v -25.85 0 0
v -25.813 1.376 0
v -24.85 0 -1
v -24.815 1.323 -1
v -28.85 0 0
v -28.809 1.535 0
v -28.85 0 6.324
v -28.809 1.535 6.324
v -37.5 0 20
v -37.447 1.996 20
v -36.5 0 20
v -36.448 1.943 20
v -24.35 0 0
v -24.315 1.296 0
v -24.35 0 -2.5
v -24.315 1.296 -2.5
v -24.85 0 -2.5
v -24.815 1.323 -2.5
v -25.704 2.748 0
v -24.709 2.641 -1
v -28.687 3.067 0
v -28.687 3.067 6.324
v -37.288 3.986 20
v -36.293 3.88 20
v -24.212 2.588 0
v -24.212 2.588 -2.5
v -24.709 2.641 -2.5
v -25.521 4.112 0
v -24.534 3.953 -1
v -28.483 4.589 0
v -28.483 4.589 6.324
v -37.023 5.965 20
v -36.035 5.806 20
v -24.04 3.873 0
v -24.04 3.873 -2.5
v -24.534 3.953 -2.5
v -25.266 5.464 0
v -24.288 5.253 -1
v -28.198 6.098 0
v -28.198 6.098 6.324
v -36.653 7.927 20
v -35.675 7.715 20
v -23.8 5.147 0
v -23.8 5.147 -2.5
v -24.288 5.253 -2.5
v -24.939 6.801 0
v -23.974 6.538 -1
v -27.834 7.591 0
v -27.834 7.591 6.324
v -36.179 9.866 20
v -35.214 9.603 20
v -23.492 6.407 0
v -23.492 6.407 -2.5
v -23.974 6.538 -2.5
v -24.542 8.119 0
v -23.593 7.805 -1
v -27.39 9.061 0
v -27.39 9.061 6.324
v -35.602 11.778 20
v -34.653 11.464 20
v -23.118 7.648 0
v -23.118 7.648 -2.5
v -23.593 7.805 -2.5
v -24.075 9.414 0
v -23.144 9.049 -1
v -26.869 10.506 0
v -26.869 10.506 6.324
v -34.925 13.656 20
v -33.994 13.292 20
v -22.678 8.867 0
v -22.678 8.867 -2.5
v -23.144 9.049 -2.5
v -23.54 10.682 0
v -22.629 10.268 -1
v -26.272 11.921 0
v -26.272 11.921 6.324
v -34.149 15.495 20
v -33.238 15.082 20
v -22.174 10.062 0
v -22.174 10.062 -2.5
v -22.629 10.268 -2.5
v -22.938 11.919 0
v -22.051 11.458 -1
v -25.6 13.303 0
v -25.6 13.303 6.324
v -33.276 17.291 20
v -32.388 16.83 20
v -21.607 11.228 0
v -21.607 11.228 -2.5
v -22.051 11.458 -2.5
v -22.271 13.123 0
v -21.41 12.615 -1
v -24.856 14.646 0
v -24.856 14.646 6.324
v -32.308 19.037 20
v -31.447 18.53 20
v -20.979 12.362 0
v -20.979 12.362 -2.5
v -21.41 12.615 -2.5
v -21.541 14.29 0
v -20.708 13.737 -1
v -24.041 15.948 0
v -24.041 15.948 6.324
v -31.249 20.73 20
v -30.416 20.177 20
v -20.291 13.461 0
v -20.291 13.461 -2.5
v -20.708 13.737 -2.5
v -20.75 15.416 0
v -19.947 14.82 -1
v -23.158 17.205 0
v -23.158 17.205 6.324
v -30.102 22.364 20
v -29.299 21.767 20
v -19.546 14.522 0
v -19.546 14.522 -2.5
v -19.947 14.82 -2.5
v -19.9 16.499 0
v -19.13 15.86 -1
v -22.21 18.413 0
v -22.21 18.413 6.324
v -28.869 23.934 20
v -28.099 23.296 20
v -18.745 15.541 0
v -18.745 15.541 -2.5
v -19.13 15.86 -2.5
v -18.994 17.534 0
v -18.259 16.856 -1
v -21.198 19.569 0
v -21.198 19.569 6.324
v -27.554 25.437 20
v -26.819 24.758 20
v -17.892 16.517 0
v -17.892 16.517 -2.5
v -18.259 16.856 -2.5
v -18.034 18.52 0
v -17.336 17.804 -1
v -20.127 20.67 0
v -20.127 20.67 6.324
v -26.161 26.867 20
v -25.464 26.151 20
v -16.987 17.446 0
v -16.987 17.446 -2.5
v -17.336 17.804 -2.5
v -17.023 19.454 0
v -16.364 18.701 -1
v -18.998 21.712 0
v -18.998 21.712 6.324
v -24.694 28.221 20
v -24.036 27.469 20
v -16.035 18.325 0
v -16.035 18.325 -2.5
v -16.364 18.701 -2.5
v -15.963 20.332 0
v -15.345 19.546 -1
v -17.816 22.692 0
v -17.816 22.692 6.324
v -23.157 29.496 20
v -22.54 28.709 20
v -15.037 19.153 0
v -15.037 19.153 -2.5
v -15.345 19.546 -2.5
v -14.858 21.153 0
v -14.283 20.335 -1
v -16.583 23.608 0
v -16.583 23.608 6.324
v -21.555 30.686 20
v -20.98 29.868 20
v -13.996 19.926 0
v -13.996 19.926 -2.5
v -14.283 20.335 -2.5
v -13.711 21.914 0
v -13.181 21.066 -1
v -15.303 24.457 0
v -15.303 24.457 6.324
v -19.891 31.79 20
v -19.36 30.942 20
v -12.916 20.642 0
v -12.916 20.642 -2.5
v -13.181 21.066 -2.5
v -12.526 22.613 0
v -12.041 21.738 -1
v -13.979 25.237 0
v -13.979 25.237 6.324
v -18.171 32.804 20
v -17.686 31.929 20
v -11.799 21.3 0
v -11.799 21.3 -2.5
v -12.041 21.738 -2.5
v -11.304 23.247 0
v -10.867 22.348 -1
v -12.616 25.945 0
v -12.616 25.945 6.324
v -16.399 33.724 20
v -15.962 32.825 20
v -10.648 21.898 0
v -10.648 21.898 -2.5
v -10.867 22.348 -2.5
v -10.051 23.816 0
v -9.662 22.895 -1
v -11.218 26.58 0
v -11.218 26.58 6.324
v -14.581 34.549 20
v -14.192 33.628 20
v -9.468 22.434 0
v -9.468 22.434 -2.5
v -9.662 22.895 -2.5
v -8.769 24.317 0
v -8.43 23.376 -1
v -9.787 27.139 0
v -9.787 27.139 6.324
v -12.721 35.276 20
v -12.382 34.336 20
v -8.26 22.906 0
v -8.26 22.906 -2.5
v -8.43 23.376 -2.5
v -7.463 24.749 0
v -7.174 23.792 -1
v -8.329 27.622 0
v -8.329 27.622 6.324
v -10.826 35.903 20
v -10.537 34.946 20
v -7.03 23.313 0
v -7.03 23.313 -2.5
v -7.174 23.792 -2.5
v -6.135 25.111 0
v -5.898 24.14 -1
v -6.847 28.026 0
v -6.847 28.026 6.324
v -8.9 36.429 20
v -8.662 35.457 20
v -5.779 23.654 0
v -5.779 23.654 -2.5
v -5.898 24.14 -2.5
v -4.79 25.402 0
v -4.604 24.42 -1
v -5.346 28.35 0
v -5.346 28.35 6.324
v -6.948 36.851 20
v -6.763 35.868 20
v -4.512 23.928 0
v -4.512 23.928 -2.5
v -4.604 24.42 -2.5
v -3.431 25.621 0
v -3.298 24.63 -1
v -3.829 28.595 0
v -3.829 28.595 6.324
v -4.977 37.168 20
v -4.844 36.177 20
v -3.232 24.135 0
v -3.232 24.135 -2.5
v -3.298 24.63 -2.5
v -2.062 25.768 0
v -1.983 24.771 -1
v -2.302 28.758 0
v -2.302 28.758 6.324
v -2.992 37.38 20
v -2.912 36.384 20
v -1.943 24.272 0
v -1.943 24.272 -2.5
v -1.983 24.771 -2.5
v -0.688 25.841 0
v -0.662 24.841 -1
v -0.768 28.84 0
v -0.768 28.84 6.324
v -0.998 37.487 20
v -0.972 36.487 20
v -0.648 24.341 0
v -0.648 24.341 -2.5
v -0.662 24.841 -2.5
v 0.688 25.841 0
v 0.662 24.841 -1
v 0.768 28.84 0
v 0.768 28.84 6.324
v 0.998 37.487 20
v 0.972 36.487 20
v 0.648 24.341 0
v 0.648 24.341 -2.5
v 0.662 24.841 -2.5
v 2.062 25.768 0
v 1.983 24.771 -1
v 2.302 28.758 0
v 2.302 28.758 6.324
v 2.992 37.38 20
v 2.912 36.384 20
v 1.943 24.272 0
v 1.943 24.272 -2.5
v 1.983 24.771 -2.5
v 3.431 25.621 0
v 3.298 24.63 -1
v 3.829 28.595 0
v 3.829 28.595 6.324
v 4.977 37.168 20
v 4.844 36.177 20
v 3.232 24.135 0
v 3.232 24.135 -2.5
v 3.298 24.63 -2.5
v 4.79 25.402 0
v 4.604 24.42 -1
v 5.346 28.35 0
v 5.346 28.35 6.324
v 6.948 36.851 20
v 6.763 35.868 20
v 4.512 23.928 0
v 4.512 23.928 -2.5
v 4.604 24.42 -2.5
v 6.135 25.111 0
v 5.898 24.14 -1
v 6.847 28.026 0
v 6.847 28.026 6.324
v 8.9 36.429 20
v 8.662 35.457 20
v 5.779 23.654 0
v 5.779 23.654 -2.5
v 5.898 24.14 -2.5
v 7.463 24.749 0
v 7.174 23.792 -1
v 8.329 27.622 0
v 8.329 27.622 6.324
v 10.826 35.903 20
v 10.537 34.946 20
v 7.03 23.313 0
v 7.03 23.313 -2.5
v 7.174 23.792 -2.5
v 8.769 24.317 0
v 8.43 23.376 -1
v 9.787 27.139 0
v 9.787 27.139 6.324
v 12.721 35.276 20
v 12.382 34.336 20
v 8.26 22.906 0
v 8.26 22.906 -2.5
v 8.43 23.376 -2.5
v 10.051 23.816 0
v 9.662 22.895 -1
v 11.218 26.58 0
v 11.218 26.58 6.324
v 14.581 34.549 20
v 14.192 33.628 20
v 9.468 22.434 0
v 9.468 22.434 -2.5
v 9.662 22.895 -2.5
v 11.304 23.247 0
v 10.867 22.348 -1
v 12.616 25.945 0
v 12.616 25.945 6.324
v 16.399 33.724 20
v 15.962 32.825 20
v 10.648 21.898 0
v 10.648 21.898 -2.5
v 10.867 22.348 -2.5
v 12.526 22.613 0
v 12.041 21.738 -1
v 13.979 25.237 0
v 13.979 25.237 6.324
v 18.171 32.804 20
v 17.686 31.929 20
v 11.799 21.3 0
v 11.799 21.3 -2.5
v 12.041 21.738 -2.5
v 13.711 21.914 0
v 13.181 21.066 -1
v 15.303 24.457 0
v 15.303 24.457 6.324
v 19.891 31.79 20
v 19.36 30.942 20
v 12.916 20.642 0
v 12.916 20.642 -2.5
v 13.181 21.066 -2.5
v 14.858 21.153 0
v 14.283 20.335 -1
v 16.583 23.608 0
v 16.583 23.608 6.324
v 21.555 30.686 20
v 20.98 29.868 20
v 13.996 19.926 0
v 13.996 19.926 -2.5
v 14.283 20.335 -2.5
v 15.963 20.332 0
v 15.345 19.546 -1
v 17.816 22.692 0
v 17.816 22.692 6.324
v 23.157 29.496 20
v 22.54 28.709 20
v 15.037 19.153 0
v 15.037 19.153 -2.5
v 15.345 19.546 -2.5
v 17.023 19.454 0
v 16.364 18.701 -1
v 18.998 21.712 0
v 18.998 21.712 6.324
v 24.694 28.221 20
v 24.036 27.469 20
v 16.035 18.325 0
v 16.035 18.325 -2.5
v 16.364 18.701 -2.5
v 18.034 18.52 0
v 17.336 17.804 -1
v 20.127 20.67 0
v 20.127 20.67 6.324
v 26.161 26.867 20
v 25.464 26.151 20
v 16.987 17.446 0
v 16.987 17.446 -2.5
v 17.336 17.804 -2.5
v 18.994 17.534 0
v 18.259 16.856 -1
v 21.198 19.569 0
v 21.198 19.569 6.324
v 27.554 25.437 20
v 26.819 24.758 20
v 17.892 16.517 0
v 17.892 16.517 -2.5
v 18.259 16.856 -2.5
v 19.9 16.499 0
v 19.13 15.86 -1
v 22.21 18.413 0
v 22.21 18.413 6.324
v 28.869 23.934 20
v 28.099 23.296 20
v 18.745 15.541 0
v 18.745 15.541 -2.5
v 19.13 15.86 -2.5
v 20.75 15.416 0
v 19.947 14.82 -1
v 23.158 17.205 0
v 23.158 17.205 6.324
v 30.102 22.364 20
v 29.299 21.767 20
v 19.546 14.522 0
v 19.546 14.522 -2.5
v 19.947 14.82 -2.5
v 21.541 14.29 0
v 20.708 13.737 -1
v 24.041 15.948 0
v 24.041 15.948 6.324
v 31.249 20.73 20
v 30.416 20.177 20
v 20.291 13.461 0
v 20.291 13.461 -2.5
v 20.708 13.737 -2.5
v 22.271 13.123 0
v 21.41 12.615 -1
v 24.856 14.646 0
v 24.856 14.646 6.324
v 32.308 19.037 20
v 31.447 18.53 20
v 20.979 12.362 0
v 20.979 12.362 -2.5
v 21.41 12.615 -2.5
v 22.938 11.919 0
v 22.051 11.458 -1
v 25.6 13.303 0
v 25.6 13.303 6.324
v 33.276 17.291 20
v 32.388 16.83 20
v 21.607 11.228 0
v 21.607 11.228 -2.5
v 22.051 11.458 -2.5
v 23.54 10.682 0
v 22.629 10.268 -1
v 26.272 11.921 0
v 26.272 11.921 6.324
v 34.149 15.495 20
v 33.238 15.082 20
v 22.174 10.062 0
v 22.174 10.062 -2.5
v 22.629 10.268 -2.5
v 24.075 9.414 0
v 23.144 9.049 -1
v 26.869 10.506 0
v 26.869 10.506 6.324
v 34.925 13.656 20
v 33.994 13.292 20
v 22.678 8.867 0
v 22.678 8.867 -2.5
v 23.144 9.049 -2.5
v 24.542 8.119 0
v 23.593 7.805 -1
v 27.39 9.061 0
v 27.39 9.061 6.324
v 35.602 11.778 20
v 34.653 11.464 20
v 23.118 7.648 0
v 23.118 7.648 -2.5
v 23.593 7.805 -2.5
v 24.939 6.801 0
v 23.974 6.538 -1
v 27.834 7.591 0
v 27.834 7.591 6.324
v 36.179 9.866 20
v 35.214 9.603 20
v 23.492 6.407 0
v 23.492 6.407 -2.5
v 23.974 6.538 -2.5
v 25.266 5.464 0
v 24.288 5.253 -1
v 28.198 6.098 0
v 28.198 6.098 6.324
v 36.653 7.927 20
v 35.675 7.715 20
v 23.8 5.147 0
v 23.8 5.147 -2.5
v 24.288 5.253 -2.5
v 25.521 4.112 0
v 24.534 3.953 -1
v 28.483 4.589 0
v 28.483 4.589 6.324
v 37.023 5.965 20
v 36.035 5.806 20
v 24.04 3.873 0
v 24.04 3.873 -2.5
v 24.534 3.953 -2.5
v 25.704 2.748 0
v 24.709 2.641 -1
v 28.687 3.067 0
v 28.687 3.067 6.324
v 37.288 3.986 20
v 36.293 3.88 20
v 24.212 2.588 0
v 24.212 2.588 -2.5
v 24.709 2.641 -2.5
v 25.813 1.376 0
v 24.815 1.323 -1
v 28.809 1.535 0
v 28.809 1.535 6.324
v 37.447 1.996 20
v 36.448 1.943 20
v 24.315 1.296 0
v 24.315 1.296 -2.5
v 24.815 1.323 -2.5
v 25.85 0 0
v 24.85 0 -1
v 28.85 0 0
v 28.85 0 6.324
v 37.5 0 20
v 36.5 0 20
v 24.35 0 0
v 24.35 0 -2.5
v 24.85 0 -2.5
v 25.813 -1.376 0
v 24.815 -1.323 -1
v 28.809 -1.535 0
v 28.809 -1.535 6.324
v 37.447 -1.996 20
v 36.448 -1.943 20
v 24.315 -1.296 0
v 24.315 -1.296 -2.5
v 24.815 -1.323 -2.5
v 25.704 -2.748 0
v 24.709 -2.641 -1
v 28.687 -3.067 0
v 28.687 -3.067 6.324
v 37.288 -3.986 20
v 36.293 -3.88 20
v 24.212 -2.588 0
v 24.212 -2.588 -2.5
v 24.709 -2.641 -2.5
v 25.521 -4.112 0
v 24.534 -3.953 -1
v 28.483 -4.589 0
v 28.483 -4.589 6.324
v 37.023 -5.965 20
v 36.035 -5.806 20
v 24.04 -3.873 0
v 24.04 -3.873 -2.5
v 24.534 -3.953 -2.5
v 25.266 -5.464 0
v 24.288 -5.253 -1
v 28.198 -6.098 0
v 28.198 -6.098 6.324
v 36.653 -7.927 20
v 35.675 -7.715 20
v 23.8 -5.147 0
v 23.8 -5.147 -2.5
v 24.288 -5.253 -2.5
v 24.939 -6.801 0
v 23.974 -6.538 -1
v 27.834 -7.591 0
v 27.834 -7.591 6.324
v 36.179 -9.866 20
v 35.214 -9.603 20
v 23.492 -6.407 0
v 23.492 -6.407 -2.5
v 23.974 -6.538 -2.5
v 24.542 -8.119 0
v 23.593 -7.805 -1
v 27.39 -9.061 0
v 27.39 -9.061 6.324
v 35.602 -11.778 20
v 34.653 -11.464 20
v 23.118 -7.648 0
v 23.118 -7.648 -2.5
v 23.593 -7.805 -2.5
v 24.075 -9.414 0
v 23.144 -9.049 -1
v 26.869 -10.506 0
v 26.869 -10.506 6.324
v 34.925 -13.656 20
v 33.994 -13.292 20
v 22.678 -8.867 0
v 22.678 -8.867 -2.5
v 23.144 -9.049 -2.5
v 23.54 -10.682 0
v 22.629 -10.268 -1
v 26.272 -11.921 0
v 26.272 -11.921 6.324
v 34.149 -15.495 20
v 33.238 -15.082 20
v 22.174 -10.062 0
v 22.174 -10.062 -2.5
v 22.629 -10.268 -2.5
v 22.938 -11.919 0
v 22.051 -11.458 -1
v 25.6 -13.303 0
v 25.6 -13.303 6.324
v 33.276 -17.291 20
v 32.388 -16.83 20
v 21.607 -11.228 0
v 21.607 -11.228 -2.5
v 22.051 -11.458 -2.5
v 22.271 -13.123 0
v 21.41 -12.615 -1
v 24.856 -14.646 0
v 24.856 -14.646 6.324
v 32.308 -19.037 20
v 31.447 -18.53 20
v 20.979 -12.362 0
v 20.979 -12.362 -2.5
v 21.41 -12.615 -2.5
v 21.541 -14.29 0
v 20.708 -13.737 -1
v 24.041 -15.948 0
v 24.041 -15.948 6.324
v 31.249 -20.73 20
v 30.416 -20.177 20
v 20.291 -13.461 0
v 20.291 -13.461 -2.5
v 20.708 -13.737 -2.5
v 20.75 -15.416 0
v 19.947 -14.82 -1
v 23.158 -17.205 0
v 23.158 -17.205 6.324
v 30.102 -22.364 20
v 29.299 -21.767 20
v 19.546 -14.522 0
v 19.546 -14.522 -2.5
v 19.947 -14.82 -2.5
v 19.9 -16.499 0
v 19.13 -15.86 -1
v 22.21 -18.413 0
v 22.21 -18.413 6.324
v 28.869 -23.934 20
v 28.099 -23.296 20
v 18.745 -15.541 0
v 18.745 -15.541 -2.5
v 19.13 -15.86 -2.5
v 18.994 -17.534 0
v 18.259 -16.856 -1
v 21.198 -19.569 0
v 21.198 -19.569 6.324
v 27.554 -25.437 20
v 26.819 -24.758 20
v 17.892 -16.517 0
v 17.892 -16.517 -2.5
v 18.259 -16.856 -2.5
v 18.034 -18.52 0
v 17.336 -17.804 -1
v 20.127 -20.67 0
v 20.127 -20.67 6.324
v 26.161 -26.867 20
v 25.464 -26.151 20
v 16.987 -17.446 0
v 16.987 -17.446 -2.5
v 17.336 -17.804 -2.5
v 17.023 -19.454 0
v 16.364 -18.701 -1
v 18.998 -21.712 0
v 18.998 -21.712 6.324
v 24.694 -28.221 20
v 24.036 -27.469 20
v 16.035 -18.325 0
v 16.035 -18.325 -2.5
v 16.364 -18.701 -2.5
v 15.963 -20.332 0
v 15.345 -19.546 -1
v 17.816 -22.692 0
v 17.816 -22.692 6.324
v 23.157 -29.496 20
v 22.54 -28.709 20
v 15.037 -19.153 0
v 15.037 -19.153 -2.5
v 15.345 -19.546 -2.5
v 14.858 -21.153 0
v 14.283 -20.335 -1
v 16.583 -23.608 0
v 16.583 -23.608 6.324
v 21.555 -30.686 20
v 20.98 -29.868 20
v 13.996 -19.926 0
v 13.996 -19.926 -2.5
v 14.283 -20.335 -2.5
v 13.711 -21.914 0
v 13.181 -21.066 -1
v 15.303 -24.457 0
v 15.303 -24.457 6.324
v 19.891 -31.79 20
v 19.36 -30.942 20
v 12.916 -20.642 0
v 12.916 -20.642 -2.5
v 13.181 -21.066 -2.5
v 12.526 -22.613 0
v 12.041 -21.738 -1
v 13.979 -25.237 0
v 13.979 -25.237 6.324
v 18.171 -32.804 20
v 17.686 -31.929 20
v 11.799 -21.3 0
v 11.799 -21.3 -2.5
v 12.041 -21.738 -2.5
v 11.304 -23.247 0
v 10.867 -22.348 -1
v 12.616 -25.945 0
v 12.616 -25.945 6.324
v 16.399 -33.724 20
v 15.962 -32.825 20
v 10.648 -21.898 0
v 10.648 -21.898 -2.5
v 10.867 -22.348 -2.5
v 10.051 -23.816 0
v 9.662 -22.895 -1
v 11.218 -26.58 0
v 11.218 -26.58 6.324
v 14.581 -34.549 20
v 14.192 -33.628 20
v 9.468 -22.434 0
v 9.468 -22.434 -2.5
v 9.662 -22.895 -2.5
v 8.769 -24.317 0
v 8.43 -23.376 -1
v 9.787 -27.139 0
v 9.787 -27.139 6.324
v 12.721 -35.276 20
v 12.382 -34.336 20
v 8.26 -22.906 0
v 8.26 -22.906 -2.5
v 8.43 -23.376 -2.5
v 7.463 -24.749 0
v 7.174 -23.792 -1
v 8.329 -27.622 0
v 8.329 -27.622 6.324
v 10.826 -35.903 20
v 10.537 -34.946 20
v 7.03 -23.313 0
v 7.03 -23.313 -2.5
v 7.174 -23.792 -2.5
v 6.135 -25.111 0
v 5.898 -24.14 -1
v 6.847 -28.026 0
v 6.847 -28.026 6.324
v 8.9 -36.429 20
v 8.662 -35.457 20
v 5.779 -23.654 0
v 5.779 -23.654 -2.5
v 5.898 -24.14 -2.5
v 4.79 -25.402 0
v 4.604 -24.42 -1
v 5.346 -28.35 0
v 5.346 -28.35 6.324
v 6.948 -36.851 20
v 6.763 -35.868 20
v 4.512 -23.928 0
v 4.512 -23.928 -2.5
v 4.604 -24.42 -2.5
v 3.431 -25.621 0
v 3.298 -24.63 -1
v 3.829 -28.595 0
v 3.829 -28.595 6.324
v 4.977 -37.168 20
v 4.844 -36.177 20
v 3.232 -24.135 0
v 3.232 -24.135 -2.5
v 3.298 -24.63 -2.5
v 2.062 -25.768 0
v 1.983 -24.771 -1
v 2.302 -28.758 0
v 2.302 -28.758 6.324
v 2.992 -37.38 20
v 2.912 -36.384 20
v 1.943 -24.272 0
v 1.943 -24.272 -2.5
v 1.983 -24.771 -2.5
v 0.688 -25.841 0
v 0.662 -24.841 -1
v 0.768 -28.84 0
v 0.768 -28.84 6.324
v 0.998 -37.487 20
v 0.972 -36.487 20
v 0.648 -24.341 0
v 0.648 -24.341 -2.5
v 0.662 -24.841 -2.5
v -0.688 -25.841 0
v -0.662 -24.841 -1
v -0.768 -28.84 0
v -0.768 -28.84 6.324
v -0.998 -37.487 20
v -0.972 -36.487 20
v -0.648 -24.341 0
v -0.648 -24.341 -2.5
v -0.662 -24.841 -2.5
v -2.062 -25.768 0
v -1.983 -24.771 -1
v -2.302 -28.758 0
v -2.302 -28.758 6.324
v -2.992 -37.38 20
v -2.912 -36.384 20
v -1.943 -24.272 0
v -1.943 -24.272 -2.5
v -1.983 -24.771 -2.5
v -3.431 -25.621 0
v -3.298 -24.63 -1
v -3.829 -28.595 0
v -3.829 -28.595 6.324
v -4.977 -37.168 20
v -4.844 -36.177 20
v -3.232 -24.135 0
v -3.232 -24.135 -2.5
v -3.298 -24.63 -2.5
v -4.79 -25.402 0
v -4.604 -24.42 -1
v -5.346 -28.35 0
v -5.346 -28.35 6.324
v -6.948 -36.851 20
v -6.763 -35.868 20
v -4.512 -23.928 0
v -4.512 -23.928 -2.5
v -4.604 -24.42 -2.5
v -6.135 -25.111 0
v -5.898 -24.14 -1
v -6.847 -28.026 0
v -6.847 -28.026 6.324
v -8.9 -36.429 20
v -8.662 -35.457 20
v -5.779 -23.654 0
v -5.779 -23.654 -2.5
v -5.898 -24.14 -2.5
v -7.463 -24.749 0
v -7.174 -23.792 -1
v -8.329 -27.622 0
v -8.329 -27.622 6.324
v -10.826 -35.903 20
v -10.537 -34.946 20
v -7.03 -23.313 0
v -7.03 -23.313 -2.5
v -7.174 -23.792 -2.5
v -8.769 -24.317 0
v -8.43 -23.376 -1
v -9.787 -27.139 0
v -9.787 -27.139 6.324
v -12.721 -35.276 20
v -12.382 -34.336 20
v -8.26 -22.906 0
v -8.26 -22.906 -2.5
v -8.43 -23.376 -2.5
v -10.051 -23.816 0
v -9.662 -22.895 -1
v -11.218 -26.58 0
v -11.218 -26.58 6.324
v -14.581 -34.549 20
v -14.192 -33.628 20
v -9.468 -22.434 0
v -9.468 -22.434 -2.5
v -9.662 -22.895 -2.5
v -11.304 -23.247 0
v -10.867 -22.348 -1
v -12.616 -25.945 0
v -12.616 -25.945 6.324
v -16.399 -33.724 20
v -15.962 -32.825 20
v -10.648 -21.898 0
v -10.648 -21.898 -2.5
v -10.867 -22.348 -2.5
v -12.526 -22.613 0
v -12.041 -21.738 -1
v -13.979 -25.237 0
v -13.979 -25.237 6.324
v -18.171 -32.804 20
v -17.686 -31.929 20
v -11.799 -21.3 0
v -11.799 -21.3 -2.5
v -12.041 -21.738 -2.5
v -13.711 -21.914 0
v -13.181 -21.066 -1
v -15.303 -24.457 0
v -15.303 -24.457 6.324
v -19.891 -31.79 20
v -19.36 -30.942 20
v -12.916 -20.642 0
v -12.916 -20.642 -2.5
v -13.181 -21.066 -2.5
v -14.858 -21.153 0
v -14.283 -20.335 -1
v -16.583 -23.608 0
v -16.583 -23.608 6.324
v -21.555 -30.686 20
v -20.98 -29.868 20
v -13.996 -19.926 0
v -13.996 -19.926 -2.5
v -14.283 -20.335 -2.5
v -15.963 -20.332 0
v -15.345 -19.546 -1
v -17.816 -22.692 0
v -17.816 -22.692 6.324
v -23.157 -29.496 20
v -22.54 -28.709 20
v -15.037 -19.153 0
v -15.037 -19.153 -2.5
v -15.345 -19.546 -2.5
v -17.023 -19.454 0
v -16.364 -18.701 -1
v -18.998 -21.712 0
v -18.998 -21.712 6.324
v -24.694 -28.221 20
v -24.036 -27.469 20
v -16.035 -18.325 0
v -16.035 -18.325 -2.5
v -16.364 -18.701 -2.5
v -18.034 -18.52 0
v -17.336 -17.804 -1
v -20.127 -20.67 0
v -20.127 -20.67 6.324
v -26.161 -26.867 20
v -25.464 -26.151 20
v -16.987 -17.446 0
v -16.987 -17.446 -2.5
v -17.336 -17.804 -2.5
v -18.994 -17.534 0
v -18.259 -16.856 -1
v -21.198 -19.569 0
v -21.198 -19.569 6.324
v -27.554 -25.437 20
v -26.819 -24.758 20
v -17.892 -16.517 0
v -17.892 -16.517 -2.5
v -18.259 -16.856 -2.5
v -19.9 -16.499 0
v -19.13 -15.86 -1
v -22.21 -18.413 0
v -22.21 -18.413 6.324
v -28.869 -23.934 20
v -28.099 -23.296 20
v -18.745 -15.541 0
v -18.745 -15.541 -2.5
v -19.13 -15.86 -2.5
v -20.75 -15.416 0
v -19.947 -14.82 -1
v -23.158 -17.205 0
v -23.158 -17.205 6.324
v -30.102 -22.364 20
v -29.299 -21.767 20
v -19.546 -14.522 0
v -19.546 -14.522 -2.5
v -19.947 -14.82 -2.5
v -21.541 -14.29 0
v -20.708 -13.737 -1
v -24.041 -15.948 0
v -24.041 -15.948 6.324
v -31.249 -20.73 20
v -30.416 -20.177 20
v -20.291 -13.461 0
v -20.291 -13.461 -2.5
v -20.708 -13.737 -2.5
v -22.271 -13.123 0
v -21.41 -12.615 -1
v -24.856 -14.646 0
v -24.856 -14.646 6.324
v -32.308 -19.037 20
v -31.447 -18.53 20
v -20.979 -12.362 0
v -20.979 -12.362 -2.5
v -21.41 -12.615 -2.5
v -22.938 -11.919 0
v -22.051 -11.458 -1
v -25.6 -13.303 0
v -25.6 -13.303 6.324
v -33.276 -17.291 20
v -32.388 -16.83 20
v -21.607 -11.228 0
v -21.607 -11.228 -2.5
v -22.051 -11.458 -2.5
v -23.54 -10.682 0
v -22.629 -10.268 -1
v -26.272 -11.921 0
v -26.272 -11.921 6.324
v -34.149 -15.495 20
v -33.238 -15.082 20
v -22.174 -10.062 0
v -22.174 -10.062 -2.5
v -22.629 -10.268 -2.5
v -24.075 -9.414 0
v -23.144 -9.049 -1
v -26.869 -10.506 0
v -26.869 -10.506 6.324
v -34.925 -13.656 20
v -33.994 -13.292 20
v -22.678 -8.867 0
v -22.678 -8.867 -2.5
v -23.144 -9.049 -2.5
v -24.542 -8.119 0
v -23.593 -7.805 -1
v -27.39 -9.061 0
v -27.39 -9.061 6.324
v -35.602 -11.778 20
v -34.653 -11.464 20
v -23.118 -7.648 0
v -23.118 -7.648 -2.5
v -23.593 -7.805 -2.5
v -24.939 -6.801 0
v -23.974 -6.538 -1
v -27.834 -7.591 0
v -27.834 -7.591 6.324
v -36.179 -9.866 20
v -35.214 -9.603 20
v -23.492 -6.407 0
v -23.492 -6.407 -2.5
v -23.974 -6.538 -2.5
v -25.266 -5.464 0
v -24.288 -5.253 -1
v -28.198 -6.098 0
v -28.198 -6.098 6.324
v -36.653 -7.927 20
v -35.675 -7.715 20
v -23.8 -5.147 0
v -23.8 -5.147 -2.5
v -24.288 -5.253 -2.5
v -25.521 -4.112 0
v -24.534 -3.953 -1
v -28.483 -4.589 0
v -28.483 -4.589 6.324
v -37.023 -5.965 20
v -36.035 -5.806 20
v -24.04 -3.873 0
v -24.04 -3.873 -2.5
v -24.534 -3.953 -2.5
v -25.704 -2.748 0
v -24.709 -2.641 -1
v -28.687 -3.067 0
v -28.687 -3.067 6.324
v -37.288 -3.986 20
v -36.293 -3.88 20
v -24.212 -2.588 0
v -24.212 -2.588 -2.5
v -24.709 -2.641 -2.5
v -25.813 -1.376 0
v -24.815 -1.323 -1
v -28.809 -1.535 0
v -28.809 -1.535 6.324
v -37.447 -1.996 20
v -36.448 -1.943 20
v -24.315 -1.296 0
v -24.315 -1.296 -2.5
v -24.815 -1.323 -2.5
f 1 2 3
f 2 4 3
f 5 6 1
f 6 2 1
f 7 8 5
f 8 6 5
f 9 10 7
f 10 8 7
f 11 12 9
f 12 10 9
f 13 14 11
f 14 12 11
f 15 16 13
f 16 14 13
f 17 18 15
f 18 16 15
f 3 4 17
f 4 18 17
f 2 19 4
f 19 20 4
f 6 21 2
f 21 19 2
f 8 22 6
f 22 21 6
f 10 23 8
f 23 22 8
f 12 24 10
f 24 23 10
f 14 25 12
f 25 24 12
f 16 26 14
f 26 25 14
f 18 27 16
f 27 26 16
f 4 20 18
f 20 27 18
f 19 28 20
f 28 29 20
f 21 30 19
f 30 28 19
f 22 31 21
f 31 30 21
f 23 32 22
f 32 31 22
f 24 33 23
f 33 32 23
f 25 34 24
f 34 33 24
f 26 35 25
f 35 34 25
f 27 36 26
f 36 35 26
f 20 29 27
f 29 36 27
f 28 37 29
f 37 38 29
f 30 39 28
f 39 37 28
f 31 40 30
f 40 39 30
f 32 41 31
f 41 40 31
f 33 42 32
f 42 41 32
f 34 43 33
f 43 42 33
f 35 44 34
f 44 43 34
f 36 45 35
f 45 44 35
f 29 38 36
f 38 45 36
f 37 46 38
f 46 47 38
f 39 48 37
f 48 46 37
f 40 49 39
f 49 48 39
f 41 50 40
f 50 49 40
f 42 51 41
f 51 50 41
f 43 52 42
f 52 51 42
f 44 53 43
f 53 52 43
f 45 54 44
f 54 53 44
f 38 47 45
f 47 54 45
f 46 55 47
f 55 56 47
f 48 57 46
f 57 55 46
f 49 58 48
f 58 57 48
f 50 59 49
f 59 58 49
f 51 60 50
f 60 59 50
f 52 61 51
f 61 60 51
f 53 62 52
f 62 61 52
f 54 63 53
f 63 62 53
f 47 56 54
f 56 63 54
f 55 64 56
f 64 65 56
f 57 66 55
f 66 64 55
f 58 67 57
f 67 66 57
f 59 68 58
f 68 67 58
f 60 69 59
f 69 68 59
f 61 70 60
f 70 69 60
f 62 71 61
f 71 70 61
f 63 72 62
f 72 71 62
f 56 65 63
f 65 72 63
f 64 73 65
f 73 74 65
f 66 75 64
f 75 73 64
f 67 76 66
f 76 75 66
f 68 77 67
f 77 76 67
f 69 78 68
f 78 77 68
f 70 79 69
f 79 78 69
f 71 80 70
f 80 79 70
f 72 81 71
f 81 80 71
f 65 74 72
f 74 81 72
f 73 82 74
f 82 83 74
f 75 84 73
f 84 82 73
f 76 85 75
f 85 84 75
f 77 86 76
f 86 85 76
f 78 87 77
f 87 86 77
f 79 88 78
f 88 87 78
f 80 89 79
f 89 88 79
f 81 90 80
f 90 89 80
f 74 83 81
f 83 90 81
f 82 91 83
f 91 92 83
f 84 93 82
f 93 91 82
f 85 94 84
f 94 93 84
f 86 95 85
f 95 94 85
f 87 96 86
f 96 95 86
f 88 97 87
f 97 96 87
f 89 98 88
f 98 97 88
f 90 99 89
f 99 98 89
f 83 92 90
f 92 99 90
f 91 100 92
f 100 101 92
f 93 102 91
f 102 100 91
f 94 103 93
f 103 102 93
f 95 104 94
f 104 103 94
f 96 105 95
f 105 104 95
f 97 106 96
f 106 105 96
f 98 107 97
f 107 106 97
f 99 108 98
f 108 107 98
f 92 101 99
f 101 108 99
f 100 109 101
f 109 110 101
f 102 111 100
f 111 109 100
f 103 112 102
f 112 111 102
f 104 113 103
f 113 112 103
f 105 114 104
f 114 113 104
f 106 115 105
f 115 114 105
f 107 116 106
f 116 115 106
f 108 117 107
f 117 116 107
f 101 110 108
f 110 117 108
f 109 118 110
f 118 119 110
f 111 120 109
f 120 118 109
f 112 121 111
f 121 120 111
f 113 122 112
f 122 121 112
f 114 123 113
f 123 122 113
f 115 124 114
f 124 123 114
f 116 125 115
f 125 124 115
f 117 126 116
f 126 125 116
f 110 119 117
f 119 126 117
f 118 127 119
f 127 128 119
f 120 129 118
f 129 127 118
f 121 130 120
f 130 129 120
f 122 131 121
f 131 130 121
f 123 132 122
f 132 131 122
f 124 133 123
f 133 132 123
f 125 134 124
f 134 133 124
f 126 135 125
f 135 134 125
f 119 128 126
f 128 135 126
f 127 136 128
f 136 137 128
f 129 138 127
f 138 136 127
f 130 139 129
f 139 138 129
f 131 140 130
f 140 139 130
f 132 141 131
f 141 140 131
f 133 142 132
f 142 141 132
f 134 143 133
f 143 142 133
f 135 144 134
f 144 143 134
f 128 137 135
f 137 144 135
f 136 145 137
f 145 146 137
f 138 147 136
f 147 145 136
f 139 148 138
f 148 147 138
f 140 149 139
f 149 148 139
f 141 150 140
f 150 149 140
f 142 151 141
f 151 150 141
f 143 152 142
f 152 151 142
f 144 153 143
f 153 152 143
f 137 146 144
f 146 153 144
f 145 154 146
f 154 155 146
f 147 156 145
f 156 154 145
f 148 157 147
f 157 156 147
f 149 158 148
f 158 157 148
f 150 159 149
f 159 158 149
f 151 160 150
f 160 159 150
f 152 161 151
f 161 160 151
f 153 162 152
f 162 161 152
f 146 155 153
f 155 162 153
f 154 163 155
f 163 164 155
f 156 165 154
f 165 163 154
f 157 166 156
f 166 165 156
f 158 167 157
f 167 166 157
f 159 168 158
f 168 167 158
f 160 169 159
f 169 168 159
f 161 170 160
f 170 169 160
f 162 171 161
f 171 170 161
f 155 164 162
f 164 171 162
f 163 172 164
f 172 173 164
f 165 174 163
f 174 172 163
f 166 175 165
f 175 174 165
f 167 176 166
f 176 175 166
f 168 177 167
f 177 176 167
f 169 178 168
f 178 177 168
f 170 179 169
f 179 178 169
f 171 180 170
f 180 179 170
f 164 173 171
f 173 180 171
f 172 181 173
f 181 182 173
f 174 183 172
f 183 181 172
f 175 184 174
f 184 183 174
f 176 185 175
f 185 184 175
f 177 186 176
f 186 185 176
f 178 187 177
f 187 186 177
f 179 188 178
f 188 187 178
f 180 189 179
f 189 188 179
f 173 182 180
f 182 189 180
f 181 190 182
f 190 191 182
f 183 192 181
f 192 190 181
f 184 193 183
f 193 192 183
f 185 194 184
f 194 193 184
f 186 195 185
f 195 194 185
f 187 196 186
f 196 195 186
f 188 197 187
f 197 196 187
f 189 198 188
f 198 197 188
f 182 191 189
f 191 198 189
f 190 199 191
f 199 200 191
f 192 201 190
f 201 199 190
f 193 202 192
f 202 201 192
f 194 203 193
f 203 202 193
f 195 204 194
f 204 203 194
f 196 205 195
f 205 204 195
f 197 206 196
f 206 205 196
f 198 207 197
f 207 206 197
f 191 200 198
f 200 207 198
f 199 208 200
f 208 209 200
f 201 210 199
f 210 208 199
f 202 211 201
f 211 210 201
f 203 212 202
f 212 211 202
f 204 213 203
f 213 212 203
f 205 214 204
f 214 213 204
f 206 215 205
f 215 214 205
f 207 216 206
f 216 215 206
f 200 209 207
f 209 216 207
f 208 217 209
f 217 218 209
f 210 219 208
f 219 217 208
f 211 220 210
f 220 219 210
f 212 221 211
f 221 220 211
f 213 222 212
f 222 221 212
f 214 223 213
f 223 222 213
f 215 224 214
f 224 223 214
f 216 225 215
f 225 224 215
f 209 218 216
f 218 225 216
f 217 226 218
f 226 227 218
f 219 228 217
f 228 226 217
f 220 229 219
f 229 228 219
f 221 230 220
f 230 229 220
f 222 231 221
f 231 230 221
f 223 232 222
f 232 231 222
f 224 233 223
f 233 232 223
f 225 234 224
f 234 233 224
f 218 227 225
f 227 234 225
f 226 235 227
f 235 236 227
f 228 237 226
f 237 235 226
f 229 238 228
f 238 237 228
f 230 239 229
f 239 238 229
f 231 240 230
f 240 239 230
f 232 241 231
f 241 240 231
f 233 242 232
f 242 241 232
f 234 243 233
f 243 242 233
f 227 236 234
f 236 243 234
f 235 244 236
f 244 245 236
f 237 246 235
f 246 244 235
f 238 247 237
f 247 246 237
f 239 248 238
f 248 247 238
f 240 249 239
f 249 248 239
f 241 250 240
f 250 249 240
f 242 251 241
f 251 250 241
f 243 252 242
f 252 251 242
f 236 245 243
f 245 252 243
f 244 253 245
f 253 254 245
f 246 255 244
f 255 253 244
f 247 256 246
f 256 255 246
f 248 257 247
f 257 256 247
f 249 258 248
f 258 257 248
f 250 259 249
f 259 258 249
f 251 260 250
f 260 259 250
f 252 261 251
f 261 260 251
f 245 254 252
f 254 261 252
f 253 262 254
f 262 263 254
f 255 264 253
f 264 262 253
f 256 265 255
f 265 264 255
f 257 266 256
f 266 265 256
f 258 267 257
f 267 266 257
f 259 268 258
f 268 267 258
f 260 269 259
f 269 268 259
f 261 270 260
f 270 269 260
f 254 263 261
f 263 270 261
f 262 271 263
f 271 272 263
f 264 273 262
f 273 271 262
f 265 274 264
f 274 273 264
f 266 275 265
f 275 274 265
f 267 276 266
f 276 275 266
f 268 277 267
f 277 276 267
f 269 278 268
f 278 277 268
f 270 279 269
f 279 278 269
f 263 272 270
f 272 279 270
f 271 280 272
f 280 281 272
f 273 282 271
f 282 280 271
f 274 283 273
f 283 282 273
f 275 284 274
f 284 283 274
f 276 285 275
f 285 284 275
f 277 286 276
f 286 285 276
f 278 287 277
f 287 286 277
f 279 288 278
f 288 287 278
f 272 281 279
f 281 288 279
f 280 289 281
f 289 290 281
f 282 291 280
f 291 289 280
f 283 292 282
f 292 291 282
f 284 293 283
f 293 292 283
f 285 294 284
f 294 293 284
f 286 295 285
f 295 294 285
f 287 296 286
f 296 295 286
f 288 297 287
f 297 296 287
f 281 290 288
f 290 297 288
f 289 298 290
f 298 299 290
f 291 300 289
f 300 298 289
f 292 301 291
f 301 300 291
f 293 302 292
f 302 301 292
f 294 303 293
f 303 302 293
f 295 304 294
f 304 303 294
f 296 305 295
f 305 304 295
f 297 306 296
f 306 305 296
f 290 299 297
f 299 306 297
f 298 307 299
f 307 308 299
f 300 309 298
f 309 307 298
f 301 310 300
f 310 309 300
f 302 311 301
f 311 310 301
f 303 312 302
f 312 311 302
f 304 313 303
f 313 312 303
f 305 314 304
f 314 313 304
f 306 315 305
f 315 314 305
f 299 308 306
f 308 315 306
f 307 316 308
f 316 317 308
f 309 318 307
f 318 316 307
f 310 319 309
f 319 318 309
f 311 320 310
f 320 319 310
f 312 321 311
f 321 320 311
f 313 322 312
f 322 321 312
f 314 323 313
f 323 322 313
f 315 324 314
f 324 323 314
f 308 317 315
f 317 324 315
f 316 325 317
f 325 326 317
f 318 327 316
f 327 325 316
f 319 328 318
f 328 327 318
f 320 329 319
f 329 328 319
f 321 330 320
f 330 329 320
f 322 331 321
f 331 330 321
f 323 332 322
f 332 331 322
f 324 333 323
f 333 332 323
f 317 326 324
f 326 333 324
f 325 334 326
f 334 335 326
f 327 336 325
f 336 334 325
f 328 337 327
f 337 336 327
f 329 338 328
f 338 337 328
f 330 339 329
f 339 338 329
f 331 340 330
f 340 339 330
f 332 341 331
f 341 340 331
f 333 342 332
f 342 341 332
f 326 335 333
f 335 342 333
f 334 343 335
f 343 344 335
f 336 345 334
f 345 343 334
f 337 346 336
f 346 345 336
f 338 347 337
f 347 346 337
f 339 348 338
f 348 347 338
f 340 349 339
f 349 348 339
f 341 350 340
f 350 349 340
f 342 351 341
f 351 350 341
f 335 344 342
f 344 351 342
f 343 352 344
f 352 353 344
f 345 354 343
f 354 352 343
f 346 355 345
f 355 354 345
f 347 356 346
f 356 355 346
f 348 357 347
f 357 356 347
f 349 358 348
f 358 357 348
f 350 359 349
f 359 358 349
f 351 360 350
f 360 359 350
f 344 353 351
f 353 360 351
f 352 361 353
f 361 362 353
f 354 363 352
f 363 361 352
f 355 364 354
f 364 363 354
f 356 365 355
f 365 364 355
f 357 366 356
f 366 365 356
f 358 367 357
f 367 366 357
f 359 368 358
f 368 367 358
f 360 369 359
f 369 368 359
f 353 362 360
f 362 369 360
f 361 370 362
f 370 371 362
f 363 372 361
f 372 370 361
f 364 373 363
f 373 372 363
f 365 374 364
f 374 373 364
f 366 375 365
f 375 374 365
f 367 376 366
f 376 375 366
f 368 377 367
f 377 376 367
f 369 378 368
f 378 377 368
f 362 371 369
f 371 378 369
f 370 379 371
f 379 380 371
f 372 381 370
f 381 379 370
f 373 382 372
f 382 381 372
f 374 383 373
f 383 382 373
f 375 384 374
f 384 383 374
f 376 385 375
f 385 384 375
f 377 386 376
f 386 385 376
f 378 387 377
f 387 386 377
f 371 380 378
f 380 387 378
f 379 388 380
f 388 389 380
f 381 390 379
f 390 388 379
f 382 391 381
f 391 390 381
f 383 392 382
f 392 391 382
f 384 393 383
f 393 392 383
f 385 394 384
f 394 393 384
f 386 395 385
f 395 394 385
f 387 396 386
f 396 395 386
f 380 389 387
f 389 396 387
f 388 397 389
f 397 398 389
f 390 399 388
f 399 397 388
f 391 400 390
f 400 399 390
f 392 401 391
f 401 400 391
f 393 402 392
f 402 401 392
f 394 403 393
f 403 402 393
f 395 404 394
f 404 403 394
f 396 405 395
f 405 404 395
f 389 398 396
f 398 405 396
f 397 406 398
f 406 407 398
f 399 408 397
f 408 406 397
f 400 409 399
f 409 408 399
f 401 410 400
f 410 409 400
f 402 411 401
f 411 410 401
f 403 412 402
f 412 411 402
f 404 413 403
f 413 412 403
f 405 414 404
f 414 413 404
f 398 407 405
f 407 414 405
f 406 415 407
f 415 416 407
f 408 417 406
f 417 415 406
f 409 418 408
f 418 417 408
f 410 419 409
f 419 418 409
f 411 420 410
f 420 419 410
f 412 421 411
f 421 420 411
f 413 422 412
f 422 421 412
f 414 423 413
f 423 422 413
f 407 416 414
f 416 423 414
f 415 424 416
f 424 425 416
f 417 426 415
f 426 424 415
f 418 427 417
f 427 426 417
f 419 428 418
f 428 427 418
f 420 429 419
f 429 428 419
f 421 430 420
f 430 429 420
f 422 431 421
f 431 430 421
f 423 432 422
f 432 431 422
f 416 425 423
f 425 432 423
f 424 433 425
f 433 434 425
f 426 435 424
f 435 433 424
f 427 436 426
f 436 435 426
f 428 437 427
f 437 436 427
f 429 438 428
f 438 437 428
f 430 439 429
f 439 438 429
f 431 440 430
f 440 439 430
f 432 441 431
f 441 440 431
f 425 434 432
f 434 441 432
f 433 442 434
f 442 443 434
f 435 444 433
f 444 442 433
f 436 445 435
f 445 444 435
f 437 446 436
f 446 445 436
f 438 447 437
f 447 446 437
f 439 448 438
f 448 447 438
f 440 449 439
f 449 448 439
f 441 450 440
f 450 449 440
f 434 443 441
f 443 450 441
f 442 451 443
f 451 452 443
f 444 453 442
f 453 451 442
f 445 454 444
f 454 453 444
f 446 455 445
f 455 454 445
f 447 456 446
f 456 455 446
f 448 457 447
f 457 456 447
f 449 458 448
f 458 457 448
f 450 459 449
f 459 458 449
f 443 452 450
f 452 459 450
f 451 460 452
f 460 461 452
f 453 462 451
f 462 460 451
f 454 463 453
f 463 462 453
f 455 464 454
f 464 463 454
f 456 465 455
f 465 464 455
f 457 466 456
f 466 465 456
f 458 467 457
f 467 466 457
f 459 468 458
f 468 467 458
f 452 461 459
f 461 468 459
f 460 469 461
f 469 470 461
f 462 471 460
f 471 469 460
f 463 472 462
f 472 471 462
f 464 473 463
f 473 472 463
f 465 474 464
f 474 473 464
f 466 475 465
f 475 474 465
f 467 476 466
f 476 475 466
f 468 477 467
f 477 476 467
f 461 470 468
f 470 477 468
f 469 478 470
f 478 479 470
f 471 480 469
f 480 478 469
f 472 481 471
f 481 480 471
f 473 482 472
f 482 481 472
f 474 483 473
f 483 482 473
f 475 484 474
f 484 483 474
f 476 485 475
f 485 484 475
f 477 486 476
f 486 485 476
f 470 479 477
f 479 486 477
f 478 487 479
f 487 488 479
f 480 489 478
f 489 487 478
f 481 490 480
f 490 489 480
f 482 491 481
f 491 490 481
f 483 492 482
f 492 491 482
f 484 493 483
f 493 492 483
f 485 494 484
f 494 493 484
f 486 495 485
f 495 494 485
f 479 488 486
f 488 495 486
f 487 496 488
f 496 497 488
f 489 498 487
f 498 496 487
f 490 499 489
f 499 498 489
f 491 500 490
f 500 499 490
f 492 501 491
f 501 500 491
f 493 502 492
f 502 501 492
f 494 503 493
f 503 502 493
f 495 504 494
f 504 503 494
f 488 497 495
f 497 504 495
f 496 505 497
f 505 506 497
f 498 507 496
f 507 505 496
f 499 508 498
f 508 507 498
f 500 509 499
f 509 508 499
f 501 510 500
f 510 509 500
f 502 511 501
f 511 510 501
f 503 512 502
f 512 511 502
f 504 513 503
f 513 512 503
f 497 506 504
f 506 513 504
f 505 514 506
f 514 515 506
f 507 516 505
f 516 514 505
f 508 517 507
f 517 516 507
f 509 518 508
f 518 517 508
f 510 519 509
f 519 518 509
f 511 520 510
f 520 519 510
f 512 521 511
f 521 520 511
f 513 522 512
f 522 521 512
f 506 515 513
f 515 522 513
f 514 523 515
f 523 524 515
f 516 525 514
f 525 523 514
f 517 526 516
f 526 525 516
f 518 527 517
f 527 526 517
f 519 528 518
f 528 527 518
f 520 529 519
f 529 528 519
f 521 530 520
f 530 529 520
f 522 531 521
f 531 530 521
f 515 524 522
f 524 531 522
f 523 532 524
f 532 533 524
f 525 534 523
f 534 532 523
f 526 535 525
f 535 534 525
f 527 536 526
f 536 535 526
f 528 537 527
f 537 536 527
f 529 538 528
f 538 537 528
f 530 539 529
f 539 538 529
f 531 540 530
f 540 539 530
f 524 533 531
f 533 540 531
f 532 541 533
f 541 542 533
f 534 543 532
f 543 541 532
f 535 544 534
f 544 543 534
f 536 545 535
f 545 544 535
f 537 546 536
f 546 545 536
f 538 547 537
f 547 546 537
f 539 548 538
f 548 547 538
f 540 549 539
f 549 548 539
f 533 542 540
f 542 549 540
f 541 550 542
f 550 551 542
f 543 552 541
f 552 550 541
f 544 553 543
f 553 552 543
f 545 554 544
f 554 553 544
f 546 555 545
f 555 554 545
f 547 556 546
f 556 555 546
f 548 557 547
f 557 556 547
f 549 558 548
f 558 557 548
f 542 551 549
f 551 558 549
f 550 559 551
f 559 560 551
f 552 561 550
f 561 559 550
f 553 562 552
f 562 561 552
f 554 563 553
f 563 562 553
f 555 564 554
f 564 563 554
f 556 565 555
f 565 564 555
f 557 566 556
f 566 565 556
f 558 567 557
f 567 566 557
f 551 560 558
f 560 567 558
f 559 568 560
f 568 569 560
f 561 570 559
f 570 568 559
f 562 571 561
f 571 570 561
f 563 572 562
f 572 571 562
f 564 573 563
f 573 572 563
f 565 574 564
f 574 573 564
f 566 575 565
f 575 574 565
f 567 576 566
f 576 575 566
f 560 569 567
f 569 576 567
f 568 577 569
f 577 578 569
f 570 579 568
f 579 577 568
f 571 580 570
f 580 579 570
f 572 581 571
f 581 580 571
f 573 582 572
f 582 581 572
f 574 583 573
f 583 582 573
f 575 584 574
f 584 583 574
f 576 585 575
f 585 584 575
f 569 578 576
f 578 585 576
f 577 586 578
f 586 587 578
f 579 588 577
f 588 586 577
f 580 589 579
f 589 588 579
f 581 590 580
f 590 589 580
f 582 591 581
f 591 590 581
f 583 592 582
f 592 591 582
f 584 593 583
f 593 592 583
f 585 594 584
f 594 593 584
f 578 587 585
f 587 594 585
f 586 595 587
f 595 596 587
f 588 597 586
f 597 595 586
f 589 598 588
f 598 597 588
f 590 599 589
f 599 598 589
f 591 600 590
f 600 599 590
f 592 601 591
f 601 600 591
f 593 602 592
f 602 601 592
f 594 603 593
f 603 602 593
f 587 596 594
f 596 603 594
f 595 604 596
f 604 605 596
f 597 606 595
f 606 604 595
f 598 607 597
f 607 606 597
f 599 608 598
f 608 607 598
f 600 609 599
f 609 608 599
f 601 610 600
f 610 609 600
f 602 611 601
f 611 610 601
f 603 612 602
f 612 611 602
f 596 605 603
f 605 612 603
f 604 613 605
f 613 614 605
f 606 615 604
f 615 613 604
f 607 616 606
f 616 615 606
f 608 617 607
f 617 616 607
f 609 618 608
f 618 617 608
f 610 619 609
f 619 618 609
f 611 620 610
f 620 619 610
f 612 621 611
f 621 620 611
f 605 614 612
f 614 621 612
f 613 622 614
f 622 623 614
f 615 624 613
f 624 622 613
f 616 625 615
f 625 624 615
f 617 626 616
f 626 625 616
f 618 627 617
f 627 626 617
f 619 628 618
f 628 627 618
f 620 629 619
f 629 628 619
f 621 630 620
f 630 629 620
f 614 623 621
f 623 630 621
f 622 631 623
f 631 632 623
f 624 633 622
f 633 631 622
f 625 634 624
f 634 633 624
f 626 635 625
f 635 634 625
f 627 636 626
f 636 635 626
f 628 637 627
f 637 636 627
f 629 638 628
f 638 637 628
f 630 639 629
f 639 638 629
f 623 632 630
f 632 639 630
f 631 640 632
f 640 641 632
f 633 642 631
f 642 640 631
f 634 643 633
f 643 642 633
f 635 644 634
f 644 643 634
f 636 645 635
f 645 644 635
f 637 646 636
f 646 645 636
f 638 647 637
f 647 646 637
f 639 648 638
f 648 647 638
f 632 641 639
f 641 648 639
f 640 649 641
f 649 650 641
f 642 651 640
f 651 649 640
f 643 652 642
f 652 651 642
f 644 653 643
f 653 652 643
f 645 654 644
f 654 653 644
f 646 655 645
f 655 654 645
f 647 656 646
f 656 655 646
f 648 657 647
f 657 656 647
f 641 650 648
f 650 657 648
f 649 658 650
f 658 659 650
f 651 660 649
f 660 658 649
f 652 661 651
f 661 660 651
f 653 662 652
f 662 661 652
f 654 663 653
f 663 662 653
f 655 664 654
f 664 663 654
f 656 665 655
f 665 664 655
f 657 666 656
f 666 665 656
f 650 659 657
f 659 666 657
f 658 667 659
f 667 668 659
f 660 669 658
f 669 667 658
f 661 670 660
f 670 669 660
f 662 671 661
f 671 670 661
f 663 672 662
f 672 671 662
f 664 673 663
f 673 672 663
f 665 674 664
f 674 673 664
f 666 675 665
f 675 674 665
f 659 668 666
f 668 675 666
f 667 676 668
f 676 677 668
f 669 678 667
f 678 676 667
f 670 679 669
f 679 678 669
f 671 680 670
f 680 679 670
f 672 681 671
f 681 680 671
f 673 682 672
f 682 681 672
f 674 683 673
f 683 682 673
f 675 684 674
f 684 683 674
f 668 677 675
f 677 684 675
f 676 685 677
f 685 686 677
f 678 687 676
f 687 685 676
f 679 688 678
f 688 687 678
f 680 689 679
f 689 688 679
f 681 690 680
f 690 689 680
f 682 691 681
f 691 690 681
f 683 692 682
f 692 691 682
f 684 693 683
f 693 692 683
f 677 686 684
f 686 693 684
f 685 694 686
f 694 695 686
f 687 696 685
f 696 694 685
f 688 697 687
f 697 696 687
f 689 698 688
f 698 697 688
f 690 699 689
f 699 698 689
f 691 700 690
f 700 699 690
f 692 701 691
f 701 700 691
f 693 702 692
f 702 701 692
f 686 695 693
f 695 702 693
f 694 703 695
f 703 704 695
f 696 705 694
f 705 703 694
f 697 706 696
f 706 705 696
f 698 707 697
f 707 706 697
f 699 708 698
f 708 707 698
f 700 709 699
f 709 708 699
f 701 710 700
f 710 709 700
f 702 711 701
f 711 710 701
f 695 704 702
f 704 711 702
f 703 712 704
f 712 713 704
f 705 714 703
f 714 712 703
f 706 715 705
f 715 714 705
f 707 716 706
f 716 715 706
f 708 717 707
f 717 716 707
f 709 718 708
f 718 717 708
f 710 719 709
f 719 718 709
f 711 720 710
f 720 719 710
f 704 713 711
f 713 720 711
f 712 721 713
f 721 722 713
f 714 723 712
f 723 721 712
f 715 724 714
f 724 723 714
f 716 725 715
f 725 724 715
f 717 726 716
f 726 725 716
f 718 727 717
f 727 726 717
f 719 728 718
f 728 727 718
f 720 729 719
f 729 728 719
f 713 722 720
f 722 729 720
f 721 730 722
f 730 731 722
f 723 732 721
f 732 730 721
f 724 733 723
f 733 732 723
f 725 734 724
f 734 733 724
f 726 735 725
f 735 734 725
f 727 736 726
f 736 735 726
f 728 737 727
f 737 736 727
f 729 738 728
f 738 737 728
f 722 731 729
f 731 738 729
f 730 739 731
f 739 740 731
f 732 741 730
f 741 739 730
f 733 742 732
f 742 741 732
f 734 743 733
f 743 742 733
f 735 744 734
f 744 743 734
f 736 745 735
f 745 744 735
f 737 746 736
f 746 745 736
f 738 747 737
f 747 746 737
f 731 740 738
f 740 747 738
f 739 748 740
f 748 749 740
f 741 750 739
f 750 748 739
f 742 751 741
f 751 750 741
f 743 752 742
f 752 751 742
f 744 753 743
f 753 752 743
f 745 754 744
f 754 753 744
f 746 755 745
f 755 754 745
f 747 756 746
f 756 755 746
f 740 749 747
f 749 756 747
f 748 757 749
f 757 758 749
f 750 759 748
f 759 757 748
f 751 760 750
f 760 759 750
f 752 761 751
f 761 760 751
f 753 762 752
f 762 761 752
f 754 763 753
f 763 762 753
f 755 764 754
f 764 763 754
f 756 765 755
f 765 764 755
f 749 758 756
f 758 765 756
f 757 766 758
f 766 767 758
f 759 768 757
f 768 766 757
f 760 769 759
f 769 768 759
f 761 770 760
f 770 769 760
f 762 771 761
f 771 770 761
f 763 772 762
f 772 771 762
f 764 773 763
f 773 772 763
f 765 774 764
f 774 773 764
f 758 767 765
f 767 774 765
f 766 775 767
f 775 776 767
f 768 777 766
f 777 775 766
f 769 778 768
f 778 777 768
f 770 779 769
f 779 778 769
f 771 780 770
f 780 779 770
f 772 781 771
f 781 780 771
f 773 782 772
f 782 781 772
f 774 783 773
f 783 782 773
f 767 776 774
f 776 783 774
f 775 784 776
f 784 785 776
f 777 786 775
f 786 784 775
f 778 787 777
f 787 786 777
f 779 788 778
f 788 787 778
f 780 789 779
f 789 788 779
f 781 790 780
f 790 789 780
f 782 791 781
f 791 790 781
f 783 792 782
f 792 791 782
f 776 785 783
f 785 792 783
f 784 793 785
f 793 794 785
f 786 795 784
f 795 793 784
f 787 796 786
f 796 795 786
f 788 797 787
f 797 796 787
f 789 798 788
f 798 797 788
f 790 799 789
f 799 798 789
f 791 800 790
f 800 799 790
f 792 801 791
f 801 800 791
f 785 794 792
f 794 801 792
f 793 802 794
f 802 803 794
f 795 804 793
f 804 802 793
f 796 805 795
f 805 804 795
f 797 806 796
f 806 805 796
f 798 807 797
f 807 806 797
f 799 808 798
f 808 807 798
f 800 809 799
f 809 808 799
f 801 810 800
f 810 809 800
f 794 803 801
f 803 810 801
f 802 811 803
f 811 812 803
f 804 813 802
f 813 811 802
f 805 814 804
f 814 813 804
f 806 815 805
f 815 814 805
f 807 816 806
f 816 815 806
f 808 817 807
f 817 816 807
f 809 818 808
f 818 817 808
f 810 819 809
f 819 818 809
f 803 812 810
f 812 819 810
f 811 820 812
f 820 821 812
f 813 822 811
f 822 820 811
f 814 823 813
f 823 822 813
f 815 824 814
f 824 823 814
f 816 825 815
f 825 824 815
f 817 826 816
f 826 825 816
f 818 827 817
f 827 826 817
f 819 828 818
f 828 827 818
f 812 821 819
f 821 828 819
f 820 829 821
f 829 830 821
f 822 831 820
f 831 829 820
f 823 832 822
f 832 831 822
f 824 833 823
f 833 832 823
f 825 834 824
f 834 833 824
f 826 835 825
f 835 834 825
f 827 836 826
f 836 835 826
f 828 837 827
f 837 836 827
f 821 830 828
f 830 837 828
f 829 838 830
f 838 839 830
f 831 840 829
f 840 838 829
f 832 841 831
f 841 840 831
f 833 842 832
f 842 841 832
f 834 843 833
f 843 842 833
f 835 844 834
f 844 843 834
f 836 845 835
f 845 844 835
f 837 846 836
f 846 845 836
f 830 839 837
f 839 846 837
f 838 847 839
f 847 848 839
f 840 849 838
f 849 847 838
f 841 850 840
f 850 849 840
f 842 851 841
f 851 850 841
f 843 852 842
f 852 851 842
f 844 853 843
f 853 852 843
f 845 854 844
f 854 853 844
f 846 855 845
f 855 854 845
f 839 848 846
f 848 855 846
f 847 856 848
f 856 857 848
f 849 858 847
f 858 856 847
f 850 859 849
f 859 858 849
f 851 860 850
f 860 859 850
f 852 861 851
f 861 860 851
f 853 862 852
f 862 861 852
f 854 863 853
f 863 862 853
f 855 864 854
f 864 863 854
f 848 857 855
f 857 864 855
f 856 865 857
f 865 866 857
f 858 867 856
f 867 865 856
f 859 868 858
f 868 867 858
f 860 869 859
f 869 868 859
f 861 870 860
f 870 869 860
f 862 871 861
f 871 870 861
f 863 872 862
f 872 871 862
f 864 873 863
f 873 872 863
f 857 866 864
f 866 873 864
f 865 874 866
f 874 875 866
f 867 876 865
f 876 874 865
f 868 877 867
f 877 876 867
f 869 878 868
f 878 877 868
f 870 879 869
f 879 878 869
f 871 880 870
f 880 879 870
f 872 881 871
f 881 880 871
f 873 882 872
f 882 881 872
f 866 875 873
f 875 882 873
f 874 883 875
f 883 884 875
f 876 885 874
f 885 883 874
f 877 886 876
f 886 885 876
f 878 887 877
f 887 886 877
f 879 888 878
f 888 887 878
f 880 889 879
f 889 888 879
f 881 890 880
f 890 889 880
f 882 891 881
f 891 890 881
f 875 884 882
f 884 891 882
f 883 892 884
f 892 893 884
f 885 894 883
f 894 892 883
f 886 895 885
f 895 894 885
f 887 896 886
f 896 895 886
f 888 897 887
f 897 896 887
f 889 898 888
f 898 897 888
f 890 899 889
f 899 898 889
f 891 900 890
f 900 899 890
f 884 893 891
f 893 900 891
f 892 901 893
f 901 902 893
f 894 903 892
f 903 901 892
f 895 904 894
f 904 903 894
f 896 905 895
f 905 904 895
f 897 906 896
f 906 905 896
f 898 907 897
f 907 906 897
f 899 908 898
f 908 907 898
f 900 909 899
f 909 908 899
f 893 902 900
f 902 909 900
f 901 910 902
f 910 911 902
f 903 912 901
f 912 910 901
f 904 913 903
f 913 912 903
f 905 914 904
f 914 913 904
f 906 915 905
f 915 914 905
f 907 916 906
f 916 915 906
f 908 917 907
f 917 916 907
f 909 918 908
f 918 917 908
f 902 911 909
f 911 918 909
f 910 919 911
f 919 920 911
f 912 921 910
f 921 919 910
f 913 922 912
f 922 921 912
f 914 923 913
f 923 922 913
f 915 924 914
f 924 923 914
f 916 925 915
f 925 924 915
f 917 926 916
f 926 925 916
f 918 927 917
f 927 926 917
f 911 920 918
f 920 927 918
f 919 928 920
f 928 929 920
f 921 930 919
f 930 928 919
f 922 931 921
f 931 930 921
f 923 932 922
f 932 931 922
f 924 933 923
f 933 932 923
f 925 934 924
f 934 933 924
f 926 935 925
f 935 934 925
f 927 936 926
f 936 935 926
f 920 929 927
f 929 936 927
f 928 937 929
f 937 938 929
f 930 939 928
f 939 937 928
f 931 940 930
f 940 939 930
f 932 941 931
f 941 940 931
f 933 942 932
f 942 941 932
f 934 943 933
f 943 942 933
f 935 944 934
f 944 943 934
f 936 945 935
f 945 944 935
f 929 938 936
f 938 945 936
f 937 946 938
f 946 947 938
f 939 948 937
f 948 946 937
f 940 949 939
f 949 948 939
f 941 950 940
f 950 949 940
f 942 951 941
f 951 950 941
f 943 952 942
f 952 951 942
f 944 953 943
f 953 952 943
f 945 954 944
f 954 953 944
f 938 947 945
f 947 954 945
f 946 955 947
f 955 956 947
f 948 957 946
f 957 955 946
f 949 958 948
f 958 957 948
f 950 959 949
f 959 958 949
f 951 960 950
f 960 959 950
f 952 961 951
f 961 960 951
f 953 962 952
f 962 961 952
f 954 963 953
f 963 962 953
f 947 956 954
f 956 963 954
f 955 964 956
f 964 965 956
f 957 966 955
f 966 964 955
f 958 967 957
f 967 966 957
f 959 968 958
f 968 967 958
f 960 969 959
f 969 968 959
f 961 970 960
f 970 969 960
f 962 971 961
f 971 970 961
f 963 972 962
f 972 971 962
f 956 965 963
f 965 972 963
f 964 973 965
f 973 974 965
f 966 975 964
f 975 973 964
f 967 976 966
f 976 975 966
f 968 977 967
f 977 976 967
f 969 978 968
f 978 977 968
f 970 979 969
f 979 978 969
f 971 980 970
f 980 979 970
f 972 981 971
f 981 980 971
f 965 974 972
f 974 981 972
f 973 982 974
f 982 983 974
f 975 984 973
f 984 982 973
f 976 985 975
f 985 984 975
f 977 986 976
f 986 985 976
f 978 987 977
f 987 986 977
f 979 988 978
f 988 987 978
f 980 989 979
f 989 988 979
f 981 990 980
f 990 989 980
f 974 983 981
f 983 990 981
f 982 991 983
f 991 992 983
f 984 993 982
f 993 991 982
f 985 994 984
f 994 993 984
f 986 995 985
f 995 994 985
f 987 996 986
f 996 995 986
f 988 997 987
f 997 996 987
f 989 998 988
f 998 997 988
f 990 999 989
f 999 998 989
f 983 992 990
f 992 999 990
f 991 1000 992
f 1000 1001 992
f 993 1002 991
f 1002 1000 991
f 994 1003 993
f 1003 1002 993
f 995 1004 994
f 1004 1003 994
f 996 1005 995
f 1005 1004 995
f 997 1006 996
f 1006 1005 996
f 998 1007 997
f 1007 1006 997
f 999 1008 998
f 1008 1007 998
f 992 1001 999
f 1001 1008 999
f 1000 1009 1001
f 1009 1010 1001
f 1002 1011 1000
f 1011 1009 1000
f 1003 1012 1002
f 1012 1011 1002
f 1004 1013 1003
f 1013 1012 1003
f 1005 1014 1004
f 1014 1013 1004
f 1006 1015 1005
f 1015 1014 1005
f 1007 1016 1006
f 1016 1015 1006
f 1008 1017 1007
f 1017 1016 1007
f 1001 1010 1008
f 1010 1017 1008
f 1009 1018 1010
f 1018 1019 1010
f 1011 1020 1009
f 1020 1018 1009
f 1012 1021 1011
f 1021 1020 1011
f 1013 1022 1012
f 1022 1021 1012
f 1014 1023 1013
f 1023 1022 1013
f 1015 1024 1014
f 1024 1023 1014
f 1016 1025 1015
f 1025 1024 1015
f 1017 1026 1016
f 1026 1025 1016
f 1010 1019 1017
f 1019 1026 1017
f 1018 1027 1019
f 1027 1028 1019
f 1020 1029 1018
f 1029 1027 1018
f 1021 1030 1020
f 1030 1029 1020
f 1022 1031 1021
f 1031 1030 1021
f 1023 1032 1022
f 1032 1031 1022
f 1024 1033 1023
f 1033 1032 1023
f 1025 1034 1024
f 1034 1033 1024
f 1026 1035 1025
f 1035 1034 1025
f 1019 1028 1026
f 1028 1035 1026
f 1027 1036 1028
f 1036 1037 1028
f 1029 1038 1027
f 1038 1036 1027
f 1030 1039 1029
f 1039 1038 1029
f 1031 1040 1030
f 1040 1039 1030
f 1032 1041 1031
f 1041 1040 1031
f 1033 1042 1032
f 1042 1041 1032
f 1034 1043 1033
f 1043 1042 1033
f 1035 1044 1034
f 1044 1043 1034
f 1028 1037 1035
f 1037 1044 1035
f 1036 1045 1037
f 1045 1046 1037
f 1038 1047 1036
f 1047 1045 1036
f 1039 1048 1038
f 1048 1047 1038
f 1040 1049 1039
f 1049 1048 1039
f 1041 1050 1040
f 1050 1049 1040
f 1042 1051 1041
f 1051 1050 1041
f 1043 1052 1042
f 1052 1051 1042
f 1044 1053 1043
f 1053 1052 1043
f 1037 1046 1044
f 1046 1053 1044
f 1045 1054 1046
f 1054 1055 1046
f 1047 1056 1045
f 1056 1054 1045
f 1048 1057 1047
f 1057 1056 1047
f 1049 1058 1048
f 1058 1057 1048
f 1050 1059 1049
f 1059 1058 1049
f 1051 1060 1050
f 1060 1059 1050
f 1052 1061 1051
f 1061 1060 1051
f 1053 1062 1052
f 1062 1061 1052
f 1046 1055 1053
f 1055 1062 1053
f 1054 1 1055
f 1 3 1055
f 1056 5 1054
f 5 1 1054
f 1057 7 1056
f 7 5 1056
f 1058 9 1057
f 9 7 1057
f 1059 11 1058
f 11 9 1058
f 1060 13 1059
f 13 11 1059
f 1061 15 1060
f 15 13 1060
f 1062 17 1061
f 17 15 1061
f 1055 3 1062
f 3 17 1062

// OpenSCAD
/* [Geometry] */
FunnelOuterDiameter_bot = 49.7;
FunnelOuterDiameter_top = 75;
FunnelHeight_out = 20;
FunnelHeight_in = 2.5;
FunnelThickness_in = 0.5;
FunnelThickness_rim = 4;
FunnelThickness_top = 1;
rimChamferLength = 1;

/* [Hidden] */
$fa = 1; // increase to speed up the computation (and end up with a rougher model)

RimHeight = FunnelHeight_out*FunnelThickness_rim/((FunnelOuterDiameter_top-FunnelOuterDiameter_bot)/2);

echo(RimHeight=RimHeight);

rotate_extrude(angle = 360, convexity = 0) {
    polygon(points=[
        [(FunnelOuterDiameter_bot)/2-FunnelThickness_in, -FunnelHeight_in], 
        [FunnelOuterDiameter_bot/2, -FunnelHeight_in], 
        [FunnelOuterDiameter_bot/2, -rimChamferLength], 
        [FunnelOuterDiameter_bot/2+rimChamferLength, 0], 
        [FunnelOuterDiameter_bot/2+FunnelThickness_rim, 0], 
        [FunnelOuterDiameter_bot/2+FunnelThickness_rim, RimHeight],
        [FunnelOuterDiameter_top/2, FunnelHeight_out],
        [FunnelOuterDiameter_top/2-FunnelThickness_top, FunnelHeight_out],
        [FunnelOuterDiameter_bot/2-FunnelThickness_in, 0]
        ]);
}
